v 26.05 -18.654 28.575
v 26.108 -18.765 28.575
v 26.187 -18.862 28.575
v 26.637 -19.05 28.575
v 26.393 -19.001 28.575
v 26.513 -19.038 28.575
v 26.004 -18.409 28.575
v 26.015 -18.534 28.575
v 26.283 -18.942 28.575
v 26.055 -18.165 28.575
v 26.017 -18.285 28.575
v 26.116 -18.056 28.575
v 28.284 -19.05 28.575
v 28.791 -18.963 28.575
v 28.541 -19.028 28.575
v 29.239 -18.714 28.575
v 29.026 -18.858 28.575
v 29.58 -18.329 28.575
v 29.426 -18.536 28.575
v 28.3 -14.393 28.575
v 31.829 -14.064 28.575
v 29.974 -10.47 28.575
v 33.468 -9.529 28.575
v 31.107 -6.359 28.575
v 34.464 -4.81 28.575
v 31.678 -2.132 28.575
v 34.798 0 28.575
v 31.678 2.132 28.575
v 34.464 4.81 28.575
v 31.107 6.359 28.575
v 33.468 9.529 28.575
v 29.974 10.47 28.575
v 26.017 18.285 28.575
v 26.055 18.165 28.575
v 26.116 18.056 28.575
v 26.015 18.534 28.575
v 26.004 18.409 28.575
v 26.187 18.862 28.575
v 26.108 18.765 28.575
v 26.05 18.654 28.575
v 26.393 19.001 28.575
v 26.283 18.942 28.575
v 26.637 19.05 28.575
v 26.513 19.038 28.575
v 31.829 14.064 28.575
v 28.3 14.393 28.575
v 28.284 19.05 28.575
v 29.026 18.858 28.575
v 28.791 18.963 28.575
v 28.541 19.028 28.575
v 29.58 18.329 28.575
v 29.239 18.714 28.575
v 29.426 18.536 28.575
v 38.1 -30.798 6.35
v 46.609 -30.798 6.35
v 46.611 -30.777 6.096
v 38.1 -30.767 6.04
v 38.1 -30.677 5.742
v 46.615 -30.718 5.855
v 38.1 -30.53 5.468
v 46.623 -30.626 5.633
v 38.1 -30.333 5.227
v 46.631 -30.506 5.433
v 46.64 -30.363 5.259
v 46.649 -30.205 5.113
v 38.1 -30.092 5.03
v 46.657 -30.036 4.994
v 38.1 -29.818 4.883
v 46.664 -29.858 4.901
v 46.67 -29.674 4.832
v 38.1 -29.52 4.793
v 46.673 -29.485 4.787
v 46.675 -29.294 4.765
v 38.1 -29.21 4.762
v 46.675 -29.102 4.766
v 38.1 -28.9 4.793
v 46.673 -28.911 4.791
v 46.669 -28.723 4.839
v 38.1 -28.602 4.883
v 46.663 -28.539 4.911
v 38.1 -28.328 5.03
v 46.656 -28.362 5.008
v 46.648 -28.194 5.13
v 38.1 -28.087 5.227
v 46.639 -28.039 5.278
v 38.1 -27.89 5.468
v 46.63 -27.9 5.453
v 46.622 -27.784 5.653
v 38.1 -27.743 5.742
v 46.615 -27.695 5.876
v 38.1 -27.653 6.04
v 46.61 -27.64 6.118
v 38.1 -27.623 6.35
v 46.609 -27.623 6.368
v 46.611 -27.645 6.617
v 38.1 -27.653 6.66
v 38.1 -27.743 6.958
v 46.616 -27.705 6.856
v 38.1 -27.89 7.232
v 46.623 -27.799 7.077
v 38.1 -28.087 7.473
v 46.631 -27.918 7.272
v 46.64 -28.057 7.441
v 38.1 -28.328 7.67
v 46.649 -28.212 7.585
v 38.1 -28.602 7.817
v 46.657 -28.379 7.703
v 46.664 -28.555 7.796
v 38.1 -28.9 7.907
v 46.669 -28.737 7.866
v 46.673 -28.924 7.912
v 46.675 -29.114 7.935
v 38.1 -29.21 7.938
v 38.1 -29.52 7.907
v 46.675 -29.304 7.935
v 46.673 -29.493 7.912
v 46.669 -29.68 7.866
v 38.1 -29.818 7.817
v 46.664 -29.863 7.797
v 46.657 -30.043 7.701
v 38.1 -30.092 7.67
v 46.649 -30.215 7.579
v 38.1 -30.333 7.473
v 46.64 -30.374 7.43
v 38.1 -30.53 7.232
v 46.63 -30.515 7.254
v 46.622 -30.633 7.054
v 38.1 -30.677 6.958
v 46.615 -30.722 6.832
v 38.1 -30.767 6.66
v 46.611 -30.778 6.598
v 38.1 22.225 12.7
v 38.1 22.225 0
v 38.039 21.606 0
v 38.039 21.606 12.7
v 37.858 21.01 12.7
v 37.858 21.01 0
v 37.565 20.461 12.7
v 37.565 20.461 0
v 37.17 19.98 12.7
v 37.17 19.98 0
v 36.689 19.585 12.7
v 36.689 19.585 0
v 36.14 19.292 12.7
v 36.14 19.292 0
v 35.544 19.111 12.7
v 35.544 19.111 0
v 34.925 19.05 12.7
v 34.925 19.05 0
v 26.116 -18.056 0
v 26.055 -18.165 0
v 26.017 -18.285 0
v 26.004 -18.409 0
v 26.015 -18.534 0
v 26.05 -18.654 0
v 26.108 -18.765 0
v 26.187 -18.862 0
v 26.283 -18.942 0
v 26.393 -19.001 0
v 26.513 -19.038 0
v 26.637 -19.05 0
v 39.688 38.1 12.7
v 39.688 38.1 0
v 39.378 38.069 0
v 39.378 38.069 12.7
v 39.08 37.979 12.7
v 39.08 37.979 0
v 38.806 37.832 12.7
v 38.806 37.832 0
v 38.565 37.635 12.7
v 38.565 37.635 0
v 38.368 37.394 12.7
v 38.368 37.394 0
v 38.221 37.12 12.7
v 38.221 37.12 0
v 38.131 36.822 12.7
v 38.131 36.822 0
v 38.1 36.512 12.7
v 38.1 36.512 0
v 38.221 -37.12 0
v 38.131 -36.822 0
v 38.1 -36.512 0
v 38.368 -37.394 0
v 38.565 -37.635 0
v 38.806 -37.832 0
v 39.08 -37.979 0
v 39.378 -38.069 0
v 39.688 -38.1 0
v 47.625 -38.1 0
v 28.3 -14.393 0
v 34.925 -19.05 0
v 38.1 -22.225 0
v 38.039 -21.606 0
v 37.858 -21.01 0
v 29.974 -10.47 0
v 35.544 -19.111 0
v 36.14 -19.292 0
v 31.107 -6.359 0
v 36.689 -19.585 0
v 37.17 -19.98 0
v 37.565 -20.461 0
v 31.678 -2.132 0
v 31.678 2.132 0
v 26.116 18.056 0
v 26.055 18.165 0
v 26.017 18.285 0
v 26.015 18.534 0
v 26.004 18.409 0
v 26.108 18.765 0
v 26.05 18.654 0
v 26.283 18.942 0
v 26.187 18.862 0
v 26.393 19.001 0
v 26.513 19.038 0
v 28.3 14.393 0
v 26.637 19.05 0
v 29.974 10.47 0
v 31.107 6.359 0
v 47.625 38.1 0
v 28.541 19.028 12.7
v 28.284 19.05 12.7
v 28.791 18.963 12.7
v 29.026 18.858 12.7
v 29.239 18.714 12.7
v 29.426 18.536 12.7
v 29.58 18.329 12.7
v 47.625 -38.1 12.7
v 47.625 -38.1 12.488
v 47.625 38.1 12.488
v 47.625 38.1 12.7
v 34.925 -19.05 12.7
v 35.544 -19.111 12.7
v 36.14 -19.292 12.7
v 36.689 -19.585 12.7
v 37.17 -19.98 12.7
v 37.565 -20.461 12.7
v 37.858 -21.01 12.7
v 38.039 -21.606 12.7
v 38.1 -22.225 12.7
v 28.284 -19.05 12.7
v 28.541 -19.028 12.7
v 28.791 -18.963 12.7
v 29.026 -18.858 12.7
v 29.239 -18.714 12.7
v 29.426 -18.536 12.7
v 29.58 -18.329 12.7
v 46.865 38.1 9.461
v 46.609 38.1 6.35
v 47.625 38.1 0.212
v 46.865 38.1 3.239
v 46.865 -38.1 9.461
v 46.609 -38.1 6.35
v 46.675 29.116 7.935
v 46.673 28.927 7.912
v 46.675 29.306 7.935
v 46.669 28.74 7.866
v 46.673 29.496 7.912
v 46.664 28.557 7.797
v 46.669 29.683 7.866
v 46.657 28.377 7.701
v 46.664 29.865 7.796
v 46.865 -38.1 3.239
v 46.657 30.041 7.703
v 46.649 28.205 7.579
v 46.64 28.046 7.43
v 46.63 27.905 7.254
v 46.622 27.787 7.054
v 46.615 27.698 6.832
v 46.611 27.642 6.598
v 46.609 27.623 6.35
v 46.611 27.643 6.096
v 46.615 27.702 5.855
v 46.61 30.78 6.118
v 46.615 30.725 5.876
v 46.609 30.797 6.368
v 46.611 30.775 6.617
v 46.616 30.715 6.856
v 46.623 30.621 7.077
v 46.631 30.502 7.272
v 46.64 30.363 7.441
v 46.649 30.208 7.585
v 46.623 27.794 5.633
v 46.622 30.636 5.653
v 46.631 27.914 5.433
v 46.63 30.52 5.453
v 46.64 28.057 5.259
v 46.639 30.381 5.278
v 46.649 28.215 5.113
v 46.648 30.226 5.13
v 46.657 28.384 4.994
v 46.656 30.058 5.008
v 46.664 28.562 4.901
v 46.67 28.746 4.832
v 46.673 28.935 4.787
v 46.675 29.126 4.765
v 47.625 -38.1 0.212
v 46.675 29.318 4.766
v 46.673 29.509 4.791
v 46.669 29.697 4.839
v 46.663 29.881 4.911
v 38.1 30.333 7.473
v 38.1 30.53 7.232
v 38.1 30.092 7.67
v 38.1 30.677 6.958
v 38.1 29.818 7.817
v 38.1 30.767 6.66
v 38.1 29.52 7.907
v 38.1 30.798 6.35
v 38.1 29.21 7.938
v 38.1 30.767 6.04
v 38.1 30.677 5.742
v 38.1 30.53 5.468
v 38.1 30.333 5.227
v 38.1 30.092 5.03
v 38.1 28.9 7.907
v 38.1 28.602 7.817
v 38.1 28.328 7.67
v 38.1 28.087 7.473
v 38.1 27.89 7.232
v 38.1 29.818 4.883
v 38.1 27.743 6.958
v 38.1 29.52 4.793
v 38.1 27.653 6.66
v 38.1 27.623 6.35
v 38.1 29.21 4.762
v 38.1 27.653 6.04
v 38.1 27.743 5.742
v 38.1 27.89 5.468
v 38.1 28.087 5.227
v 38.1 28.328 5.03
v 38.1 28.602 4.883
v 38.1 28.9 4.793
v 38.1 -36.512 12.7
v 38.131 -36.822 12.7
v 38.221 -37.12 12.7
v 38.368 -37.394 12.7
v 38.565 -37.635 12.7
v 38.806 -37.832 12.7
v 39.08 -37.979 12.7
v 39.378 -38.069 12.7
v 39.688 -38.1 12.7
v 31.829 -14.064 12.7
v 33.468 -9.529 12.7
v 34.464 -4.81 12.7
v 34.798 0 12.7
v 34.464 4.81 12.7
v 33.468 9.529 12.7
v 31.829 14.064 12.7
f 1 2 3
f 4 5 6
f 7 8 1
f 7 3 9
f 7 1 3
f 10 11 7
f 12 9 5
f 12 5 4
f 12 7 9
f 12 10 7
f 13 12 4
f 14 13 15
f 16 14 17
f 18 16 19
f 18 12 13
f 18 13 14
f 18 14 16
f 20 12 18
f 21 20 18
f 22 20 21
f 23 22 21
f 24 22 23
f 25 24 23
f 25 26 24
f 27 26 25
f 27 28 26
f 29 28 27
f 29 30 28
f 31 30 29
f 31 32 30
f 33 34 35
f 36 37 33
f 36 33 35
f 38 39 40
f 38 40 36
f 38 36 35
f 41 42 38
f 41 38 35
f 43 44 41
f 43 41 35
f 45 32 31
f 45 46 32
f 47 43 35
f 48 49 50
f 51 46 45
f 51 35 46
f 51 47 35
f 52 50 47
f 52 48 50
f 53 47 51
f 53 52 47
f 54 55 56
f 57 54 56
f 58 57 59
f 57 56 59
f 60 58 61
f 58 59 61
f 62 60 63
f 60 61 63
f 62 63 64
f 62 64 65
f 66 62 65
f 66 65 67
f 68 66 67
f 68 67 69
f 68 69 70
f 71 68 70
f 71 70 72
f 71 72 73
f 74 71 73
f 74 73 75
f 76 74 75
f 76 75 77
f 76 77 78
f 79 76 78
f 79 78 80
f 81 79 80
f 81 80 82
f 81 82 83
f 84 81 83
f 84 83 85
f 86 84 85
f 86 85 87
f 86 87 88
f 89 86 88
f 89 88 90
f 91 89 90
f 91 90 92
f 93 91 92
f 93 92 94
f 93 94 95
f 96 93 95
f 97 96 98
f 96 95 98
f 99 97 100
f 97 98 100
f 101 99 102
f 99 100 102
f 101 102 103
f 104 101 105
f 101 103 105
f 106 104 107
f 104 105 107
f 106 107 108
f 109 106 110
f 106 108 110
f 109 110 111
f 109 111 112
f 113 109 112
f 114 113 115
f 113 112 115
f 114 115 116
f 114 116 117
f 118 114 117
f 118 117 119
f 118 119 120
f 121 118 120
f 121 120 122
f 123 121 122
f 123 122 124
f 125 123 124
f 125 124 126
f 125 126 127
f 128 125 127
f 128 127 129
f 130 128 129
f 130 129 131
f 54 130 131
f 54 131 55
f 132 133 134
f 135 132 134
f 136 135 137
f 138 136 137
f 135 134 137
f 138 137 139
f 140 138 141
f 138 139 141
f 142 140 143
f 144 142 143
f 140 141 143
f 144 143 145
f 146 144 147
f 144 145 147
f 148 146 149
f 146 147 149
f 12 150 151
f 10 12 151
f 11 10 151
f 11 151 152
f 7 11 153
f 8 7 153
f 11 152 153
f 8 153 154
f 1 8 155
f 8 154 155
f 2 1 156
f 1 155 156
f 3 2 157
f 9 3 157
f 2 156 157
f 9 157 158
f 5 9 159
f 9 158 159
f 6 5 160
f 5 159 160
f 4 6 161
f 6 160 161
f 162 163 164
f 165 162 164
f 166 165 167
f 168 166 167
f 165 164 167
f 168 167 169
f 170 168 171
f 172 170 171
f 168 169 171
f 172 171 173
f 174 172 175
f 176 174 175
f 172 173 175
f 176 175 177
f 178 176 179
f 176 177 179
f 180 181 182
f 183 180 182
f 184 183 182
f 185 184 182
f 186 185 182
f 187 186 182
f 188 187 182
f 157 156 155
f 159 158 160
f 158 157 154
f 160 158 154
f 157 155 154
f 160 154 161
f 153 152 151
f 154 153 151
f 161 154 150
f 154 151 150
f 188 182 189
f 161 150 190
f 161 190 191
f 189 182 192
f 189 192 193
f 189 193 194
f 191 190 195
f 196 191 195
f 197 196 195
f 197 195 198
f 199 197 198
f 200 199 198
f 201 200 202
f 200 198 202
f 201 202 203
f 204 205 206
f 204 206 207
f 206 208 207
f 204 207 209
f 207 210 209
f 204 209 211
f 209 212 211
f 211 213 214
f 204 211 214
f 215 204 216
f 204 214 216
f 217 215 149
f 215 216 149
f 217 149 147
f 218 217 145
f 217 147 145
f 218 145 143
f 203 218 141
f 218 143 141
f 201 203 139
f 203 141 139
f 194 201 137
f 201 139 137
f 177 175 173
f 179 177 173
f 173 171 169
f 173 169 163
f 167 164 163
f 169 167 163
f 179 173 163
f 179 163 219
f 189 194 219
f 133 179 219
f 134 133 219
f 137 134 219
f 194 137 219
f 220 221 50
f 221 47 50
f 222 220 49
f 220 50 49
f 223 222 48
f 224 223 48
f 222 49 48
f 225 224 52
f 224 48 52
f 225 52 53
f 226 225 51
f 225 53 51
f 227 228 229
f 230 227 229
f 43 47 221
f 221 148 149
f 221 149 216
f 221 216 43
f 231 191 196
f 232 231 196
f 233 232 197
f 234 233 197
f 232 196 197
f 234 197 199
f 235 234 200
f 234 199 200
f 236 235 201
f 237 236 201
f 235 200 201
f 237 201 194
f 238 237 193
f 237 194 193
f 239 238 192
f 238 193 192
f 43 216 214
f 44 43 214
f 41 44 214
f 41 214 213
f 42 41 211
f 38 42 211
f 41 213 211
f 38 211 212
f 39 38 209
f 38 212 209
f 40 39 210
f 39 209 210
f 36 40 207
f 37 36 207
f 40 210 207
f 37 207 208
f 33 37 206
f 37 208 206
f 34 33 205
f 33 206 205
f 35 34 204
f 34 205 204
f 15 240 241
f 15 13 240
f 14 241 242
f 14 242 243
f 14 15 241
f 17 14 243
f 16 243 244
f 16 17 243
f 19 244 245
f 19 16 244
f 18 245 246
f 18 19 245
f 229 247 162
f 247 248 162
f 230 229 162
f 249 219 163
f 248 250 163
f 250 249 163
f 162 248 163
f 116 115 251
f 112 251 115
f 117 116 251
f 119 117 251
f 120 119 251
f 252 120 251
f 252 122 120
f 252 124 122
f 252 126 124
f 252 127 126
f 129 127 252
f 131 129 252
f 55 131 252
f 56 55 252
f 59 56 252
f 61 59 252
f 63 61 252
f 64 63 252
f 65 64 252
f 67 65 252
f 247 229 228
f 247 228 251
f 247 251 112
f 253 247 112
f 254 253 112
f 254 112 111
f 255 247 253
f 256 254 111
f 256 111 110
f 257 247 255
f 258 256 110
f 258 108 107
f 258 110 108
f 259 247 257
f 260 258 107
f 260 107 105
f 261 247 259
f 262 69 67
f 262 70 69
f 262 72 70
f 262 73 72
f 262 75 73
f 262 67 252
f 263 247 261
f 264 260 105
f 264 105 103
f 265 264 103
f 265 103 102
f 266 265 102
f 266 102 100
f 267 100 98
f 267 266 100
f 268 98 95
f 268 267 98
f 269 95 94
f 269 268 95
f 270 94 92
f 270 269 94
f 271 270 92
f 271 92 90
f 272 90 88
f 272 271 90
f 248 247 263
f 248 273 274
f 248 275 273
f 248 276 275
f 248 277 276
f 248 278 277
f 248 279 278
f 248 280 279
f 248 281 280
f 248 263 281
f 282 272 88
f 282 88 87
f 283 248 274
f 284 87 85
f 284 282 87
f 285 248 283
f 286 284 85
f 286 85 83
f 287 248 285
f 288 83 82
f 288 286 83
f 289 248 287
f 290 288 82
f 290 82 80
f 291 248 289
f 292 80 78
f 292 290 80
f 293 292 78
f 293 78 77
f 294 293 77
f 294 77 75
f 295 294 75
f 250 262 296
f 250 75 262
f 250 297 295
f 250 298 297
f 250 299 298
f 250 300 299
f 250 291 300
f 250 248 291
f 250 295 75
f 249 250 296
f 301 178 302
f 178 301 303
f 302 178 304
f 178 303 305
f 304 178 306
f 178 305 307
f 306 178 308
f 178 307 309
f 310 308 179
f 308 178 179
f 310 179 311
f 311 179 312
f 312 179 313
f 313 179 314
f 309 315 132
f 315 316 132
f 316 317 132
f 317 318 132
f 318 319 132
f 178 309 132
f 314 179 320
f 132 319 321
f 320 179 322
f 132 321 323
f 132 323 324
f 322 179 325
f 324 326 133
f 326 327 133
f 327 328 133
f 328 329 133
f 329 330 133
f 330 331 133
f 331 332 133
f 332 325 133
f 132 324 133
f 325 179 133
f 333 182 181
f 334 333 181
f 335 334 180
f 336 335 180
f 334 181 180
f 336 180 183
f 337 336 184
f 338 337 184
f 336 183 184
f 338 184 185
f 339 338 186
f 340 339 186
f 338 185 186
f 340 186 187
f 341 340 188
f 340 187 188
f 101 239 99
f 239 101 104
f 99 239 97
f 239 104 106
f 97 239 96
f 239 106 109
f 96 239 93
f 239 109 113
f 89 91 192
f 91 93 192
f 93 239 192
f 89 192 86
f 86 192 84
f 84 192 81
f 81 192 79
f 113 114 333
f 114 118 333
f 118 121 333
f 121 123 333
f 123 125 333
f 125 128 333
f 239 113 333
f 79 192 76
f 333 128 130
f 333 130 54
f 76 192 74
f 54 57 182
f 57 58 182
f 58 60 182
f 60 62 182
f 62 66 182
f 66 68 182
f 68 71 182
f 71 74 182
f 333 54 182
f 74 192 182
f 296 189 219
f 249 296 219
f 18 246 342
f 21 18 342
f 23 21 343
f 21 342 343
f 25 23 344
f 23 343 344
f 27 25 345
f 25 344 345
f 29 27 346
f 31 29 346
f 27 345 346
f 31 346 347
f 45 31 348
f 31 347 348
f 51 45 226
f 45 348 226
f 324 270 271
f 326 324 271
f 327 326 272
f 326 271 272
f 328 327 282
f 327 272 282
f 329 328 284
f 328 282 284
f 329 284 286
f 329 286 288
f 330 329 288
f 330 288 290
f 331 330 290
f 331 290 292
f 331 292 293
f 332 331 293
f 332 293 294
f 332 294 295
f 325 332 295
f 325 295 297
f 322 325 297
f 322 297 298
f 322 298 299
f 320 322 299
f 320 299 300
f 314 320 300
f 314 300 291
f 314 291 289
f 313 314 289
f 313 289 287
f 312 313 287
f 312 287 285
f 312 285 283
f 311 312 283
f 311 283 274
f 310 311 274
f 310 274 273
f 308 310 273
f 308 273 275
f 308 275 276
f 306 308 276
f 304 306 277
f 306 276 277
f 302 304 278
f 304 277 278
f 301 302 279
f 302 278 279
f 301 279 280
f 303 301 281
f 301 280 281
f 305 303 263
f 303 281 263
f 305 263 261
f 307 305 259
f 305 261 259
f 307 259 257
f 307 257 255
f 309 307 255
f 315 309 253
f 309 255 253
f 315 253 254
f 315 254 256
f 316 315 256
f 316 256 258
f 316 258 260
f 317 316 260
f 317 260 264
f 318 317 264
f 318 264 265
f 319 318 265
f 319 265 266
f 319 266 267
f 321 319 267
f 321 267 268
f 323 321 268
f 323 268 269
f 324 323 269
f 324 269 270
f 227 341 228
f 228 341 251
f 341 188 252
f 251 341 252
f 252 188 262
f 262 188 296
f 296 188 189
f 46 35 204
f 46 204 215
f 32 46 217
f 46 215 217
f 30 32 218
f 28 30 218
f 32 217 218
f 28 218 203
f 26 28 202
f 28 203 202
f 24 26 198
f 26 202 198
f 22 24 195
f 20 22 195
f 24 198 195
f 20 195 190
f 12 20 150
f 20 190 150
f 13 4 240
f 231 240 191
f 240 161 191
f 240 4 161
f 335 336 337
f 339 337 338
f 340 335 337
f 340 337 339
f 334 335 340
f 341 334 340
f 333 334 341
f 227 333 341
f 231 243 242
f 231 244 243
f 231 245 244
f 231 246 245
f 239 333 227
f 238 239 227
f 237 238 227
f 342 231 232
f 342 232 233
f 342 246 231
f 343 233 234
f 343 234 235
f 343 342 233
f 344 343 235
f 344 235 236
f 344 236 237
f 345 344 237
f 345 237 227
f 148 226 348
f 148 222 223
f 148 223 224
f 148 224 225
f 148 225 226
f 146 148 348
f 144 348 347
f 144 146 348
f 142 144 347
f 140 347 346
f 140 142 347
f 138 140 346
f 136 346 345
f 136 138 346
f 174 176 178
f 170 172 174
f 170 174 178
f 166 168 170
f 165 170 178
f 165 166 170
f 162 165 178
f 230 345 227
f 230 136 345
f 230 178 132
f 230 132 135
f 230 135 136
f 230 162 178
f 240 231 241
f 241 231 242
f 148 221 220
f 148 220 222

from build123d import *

# Parameters (mm, degrees)
F1_DEPTH      = 12.7
F3_DEPTH      = 28.575
F5_D          = 3.175
F6_D          = 3.175
F7_R          = 19.05
F8_DEPTH      = 46.99
F8_DEPTH_BACK = 44.196
F9_R          = 1.524
F10_R         = 1.524


with BuildPart() as f1:
    # F0 (on Top) → F1 (new body)
    with BuildSketch(Plane.XY):
        with BuildLine():
            ThreePointArc((29.1204104367, 19.05), (34.798, 0), (29.1204104367, -19.05))
            Line((29.1204104367, -19.05), (31.75, -19.05))
            Line((31.75, -19.05), (34.925, -19.05))
            ThreePointArc((34.925, -19.05), (37.1700640303, -19.9799359697), (38.1, -22.225))
            Line((38.1, -22.225), (38.1, -25.4))
            Line((38.1, -25.4), (38.1, -36.5125))
            ThreePointArc((38.1, -36.5125), (38.5649679849, -37.6350320151), (39.6875, -38.1))
            Line((39.6875, -38.1), (47.625, -38.1))
            Line((47.625, -38.1), (47.625, 38.1))
            Line((47.625, 38.1), (39.6875, 38.1))
            ThreePointArc((39.6875, 38.1), (38.5649679849, 37.6350320151), (38.1, 36.5125))
            Line((38.1, 36.5125), (38.1, 25.4))
            Line((38.1, 25.4), (38.1, 22.225))
            ThreePointArc((38.1, 22.225), (37.1700640303, 19.9799359697), (34.925, 19.05))
            Line((34.925, 19.05), (31.75, 19.05))
            Line((31.75, 19.05), (29.1204104367, 19.05))
        make_face()
    extrude(amount=F1_DEPTH)

    # F2 (on Top) → F3 (join)
    with BuildSketch(Plane.XY):
        with BuildLine():
            ThreePointArc((26.1160885863, 18.0558139377), (31.75, 0), (26.1160885863, -18.0558139377))
            ThreePointArc((26.1160885863, -18.0558139377), (26.0761118369, -18.7105456091), (26.6373982331, -19.05))
            Line((26.6373982331, -19.05), (29.1204104367, -19.05))
            ThreePointArc((29.1204104367, -19.05), (34.798, 0), (29.1204104367, 19.05))
            Line((29.1204104367, 19.05), (26.6373982331, 19.05))
            ThreePointArc((26.6373982331, 19.05), (26.0761118369, 18.7105456091), (26.1160885863, 18.0558139377))
        make_face()
    extrude(amount=F3_DEPTH)

    # F5 (through all)
    with Locations(Plane(origin=(0, 0, 0), x_dir=(0, 1, 0), z_dir=(-1, 0, 0))):
        with Locations((-29.21, -6.35)):
            Hole(F5_D / 2)

    # F6 (through all)
    with Locations(Plane(origin=(0, 0, 0), x_dir=(0, 1, 0), z_dir=(-1, 0, 0))):
        with Locations((29.21, -6.35)):
            Hole(F6_D / 2)

    # F7 (on Front) → F8 (cut, two sides)
    with BuildSketch(Plane.XZ) as f8_sk:
        with Locations((65.659, 6.35)):
            Circle(F7_R)
    extrude(amount=F8_DEPTH, mode=Mode.SUBTRACT)
    extrude(f8_sk.sketch, amount=-F8_DEPTH_BACK, mode=Mode.SUBTRACT)

    # F9
    f9_edges = [f1.edges().sort_by_distance(p)[0] for p in [
        (29.12041, 19.05, 20.6375),
    ]]
    fillet(f9_edges, radius=F9_R)

    # F10
    f10_edges = [f1.edges().sort_by_distance(p)[0] for p in [
        (29.12041, -19.05, 20.6375),
    ]]
    fillet(f10_edges, radius=F10_R)


solid = f1.part
